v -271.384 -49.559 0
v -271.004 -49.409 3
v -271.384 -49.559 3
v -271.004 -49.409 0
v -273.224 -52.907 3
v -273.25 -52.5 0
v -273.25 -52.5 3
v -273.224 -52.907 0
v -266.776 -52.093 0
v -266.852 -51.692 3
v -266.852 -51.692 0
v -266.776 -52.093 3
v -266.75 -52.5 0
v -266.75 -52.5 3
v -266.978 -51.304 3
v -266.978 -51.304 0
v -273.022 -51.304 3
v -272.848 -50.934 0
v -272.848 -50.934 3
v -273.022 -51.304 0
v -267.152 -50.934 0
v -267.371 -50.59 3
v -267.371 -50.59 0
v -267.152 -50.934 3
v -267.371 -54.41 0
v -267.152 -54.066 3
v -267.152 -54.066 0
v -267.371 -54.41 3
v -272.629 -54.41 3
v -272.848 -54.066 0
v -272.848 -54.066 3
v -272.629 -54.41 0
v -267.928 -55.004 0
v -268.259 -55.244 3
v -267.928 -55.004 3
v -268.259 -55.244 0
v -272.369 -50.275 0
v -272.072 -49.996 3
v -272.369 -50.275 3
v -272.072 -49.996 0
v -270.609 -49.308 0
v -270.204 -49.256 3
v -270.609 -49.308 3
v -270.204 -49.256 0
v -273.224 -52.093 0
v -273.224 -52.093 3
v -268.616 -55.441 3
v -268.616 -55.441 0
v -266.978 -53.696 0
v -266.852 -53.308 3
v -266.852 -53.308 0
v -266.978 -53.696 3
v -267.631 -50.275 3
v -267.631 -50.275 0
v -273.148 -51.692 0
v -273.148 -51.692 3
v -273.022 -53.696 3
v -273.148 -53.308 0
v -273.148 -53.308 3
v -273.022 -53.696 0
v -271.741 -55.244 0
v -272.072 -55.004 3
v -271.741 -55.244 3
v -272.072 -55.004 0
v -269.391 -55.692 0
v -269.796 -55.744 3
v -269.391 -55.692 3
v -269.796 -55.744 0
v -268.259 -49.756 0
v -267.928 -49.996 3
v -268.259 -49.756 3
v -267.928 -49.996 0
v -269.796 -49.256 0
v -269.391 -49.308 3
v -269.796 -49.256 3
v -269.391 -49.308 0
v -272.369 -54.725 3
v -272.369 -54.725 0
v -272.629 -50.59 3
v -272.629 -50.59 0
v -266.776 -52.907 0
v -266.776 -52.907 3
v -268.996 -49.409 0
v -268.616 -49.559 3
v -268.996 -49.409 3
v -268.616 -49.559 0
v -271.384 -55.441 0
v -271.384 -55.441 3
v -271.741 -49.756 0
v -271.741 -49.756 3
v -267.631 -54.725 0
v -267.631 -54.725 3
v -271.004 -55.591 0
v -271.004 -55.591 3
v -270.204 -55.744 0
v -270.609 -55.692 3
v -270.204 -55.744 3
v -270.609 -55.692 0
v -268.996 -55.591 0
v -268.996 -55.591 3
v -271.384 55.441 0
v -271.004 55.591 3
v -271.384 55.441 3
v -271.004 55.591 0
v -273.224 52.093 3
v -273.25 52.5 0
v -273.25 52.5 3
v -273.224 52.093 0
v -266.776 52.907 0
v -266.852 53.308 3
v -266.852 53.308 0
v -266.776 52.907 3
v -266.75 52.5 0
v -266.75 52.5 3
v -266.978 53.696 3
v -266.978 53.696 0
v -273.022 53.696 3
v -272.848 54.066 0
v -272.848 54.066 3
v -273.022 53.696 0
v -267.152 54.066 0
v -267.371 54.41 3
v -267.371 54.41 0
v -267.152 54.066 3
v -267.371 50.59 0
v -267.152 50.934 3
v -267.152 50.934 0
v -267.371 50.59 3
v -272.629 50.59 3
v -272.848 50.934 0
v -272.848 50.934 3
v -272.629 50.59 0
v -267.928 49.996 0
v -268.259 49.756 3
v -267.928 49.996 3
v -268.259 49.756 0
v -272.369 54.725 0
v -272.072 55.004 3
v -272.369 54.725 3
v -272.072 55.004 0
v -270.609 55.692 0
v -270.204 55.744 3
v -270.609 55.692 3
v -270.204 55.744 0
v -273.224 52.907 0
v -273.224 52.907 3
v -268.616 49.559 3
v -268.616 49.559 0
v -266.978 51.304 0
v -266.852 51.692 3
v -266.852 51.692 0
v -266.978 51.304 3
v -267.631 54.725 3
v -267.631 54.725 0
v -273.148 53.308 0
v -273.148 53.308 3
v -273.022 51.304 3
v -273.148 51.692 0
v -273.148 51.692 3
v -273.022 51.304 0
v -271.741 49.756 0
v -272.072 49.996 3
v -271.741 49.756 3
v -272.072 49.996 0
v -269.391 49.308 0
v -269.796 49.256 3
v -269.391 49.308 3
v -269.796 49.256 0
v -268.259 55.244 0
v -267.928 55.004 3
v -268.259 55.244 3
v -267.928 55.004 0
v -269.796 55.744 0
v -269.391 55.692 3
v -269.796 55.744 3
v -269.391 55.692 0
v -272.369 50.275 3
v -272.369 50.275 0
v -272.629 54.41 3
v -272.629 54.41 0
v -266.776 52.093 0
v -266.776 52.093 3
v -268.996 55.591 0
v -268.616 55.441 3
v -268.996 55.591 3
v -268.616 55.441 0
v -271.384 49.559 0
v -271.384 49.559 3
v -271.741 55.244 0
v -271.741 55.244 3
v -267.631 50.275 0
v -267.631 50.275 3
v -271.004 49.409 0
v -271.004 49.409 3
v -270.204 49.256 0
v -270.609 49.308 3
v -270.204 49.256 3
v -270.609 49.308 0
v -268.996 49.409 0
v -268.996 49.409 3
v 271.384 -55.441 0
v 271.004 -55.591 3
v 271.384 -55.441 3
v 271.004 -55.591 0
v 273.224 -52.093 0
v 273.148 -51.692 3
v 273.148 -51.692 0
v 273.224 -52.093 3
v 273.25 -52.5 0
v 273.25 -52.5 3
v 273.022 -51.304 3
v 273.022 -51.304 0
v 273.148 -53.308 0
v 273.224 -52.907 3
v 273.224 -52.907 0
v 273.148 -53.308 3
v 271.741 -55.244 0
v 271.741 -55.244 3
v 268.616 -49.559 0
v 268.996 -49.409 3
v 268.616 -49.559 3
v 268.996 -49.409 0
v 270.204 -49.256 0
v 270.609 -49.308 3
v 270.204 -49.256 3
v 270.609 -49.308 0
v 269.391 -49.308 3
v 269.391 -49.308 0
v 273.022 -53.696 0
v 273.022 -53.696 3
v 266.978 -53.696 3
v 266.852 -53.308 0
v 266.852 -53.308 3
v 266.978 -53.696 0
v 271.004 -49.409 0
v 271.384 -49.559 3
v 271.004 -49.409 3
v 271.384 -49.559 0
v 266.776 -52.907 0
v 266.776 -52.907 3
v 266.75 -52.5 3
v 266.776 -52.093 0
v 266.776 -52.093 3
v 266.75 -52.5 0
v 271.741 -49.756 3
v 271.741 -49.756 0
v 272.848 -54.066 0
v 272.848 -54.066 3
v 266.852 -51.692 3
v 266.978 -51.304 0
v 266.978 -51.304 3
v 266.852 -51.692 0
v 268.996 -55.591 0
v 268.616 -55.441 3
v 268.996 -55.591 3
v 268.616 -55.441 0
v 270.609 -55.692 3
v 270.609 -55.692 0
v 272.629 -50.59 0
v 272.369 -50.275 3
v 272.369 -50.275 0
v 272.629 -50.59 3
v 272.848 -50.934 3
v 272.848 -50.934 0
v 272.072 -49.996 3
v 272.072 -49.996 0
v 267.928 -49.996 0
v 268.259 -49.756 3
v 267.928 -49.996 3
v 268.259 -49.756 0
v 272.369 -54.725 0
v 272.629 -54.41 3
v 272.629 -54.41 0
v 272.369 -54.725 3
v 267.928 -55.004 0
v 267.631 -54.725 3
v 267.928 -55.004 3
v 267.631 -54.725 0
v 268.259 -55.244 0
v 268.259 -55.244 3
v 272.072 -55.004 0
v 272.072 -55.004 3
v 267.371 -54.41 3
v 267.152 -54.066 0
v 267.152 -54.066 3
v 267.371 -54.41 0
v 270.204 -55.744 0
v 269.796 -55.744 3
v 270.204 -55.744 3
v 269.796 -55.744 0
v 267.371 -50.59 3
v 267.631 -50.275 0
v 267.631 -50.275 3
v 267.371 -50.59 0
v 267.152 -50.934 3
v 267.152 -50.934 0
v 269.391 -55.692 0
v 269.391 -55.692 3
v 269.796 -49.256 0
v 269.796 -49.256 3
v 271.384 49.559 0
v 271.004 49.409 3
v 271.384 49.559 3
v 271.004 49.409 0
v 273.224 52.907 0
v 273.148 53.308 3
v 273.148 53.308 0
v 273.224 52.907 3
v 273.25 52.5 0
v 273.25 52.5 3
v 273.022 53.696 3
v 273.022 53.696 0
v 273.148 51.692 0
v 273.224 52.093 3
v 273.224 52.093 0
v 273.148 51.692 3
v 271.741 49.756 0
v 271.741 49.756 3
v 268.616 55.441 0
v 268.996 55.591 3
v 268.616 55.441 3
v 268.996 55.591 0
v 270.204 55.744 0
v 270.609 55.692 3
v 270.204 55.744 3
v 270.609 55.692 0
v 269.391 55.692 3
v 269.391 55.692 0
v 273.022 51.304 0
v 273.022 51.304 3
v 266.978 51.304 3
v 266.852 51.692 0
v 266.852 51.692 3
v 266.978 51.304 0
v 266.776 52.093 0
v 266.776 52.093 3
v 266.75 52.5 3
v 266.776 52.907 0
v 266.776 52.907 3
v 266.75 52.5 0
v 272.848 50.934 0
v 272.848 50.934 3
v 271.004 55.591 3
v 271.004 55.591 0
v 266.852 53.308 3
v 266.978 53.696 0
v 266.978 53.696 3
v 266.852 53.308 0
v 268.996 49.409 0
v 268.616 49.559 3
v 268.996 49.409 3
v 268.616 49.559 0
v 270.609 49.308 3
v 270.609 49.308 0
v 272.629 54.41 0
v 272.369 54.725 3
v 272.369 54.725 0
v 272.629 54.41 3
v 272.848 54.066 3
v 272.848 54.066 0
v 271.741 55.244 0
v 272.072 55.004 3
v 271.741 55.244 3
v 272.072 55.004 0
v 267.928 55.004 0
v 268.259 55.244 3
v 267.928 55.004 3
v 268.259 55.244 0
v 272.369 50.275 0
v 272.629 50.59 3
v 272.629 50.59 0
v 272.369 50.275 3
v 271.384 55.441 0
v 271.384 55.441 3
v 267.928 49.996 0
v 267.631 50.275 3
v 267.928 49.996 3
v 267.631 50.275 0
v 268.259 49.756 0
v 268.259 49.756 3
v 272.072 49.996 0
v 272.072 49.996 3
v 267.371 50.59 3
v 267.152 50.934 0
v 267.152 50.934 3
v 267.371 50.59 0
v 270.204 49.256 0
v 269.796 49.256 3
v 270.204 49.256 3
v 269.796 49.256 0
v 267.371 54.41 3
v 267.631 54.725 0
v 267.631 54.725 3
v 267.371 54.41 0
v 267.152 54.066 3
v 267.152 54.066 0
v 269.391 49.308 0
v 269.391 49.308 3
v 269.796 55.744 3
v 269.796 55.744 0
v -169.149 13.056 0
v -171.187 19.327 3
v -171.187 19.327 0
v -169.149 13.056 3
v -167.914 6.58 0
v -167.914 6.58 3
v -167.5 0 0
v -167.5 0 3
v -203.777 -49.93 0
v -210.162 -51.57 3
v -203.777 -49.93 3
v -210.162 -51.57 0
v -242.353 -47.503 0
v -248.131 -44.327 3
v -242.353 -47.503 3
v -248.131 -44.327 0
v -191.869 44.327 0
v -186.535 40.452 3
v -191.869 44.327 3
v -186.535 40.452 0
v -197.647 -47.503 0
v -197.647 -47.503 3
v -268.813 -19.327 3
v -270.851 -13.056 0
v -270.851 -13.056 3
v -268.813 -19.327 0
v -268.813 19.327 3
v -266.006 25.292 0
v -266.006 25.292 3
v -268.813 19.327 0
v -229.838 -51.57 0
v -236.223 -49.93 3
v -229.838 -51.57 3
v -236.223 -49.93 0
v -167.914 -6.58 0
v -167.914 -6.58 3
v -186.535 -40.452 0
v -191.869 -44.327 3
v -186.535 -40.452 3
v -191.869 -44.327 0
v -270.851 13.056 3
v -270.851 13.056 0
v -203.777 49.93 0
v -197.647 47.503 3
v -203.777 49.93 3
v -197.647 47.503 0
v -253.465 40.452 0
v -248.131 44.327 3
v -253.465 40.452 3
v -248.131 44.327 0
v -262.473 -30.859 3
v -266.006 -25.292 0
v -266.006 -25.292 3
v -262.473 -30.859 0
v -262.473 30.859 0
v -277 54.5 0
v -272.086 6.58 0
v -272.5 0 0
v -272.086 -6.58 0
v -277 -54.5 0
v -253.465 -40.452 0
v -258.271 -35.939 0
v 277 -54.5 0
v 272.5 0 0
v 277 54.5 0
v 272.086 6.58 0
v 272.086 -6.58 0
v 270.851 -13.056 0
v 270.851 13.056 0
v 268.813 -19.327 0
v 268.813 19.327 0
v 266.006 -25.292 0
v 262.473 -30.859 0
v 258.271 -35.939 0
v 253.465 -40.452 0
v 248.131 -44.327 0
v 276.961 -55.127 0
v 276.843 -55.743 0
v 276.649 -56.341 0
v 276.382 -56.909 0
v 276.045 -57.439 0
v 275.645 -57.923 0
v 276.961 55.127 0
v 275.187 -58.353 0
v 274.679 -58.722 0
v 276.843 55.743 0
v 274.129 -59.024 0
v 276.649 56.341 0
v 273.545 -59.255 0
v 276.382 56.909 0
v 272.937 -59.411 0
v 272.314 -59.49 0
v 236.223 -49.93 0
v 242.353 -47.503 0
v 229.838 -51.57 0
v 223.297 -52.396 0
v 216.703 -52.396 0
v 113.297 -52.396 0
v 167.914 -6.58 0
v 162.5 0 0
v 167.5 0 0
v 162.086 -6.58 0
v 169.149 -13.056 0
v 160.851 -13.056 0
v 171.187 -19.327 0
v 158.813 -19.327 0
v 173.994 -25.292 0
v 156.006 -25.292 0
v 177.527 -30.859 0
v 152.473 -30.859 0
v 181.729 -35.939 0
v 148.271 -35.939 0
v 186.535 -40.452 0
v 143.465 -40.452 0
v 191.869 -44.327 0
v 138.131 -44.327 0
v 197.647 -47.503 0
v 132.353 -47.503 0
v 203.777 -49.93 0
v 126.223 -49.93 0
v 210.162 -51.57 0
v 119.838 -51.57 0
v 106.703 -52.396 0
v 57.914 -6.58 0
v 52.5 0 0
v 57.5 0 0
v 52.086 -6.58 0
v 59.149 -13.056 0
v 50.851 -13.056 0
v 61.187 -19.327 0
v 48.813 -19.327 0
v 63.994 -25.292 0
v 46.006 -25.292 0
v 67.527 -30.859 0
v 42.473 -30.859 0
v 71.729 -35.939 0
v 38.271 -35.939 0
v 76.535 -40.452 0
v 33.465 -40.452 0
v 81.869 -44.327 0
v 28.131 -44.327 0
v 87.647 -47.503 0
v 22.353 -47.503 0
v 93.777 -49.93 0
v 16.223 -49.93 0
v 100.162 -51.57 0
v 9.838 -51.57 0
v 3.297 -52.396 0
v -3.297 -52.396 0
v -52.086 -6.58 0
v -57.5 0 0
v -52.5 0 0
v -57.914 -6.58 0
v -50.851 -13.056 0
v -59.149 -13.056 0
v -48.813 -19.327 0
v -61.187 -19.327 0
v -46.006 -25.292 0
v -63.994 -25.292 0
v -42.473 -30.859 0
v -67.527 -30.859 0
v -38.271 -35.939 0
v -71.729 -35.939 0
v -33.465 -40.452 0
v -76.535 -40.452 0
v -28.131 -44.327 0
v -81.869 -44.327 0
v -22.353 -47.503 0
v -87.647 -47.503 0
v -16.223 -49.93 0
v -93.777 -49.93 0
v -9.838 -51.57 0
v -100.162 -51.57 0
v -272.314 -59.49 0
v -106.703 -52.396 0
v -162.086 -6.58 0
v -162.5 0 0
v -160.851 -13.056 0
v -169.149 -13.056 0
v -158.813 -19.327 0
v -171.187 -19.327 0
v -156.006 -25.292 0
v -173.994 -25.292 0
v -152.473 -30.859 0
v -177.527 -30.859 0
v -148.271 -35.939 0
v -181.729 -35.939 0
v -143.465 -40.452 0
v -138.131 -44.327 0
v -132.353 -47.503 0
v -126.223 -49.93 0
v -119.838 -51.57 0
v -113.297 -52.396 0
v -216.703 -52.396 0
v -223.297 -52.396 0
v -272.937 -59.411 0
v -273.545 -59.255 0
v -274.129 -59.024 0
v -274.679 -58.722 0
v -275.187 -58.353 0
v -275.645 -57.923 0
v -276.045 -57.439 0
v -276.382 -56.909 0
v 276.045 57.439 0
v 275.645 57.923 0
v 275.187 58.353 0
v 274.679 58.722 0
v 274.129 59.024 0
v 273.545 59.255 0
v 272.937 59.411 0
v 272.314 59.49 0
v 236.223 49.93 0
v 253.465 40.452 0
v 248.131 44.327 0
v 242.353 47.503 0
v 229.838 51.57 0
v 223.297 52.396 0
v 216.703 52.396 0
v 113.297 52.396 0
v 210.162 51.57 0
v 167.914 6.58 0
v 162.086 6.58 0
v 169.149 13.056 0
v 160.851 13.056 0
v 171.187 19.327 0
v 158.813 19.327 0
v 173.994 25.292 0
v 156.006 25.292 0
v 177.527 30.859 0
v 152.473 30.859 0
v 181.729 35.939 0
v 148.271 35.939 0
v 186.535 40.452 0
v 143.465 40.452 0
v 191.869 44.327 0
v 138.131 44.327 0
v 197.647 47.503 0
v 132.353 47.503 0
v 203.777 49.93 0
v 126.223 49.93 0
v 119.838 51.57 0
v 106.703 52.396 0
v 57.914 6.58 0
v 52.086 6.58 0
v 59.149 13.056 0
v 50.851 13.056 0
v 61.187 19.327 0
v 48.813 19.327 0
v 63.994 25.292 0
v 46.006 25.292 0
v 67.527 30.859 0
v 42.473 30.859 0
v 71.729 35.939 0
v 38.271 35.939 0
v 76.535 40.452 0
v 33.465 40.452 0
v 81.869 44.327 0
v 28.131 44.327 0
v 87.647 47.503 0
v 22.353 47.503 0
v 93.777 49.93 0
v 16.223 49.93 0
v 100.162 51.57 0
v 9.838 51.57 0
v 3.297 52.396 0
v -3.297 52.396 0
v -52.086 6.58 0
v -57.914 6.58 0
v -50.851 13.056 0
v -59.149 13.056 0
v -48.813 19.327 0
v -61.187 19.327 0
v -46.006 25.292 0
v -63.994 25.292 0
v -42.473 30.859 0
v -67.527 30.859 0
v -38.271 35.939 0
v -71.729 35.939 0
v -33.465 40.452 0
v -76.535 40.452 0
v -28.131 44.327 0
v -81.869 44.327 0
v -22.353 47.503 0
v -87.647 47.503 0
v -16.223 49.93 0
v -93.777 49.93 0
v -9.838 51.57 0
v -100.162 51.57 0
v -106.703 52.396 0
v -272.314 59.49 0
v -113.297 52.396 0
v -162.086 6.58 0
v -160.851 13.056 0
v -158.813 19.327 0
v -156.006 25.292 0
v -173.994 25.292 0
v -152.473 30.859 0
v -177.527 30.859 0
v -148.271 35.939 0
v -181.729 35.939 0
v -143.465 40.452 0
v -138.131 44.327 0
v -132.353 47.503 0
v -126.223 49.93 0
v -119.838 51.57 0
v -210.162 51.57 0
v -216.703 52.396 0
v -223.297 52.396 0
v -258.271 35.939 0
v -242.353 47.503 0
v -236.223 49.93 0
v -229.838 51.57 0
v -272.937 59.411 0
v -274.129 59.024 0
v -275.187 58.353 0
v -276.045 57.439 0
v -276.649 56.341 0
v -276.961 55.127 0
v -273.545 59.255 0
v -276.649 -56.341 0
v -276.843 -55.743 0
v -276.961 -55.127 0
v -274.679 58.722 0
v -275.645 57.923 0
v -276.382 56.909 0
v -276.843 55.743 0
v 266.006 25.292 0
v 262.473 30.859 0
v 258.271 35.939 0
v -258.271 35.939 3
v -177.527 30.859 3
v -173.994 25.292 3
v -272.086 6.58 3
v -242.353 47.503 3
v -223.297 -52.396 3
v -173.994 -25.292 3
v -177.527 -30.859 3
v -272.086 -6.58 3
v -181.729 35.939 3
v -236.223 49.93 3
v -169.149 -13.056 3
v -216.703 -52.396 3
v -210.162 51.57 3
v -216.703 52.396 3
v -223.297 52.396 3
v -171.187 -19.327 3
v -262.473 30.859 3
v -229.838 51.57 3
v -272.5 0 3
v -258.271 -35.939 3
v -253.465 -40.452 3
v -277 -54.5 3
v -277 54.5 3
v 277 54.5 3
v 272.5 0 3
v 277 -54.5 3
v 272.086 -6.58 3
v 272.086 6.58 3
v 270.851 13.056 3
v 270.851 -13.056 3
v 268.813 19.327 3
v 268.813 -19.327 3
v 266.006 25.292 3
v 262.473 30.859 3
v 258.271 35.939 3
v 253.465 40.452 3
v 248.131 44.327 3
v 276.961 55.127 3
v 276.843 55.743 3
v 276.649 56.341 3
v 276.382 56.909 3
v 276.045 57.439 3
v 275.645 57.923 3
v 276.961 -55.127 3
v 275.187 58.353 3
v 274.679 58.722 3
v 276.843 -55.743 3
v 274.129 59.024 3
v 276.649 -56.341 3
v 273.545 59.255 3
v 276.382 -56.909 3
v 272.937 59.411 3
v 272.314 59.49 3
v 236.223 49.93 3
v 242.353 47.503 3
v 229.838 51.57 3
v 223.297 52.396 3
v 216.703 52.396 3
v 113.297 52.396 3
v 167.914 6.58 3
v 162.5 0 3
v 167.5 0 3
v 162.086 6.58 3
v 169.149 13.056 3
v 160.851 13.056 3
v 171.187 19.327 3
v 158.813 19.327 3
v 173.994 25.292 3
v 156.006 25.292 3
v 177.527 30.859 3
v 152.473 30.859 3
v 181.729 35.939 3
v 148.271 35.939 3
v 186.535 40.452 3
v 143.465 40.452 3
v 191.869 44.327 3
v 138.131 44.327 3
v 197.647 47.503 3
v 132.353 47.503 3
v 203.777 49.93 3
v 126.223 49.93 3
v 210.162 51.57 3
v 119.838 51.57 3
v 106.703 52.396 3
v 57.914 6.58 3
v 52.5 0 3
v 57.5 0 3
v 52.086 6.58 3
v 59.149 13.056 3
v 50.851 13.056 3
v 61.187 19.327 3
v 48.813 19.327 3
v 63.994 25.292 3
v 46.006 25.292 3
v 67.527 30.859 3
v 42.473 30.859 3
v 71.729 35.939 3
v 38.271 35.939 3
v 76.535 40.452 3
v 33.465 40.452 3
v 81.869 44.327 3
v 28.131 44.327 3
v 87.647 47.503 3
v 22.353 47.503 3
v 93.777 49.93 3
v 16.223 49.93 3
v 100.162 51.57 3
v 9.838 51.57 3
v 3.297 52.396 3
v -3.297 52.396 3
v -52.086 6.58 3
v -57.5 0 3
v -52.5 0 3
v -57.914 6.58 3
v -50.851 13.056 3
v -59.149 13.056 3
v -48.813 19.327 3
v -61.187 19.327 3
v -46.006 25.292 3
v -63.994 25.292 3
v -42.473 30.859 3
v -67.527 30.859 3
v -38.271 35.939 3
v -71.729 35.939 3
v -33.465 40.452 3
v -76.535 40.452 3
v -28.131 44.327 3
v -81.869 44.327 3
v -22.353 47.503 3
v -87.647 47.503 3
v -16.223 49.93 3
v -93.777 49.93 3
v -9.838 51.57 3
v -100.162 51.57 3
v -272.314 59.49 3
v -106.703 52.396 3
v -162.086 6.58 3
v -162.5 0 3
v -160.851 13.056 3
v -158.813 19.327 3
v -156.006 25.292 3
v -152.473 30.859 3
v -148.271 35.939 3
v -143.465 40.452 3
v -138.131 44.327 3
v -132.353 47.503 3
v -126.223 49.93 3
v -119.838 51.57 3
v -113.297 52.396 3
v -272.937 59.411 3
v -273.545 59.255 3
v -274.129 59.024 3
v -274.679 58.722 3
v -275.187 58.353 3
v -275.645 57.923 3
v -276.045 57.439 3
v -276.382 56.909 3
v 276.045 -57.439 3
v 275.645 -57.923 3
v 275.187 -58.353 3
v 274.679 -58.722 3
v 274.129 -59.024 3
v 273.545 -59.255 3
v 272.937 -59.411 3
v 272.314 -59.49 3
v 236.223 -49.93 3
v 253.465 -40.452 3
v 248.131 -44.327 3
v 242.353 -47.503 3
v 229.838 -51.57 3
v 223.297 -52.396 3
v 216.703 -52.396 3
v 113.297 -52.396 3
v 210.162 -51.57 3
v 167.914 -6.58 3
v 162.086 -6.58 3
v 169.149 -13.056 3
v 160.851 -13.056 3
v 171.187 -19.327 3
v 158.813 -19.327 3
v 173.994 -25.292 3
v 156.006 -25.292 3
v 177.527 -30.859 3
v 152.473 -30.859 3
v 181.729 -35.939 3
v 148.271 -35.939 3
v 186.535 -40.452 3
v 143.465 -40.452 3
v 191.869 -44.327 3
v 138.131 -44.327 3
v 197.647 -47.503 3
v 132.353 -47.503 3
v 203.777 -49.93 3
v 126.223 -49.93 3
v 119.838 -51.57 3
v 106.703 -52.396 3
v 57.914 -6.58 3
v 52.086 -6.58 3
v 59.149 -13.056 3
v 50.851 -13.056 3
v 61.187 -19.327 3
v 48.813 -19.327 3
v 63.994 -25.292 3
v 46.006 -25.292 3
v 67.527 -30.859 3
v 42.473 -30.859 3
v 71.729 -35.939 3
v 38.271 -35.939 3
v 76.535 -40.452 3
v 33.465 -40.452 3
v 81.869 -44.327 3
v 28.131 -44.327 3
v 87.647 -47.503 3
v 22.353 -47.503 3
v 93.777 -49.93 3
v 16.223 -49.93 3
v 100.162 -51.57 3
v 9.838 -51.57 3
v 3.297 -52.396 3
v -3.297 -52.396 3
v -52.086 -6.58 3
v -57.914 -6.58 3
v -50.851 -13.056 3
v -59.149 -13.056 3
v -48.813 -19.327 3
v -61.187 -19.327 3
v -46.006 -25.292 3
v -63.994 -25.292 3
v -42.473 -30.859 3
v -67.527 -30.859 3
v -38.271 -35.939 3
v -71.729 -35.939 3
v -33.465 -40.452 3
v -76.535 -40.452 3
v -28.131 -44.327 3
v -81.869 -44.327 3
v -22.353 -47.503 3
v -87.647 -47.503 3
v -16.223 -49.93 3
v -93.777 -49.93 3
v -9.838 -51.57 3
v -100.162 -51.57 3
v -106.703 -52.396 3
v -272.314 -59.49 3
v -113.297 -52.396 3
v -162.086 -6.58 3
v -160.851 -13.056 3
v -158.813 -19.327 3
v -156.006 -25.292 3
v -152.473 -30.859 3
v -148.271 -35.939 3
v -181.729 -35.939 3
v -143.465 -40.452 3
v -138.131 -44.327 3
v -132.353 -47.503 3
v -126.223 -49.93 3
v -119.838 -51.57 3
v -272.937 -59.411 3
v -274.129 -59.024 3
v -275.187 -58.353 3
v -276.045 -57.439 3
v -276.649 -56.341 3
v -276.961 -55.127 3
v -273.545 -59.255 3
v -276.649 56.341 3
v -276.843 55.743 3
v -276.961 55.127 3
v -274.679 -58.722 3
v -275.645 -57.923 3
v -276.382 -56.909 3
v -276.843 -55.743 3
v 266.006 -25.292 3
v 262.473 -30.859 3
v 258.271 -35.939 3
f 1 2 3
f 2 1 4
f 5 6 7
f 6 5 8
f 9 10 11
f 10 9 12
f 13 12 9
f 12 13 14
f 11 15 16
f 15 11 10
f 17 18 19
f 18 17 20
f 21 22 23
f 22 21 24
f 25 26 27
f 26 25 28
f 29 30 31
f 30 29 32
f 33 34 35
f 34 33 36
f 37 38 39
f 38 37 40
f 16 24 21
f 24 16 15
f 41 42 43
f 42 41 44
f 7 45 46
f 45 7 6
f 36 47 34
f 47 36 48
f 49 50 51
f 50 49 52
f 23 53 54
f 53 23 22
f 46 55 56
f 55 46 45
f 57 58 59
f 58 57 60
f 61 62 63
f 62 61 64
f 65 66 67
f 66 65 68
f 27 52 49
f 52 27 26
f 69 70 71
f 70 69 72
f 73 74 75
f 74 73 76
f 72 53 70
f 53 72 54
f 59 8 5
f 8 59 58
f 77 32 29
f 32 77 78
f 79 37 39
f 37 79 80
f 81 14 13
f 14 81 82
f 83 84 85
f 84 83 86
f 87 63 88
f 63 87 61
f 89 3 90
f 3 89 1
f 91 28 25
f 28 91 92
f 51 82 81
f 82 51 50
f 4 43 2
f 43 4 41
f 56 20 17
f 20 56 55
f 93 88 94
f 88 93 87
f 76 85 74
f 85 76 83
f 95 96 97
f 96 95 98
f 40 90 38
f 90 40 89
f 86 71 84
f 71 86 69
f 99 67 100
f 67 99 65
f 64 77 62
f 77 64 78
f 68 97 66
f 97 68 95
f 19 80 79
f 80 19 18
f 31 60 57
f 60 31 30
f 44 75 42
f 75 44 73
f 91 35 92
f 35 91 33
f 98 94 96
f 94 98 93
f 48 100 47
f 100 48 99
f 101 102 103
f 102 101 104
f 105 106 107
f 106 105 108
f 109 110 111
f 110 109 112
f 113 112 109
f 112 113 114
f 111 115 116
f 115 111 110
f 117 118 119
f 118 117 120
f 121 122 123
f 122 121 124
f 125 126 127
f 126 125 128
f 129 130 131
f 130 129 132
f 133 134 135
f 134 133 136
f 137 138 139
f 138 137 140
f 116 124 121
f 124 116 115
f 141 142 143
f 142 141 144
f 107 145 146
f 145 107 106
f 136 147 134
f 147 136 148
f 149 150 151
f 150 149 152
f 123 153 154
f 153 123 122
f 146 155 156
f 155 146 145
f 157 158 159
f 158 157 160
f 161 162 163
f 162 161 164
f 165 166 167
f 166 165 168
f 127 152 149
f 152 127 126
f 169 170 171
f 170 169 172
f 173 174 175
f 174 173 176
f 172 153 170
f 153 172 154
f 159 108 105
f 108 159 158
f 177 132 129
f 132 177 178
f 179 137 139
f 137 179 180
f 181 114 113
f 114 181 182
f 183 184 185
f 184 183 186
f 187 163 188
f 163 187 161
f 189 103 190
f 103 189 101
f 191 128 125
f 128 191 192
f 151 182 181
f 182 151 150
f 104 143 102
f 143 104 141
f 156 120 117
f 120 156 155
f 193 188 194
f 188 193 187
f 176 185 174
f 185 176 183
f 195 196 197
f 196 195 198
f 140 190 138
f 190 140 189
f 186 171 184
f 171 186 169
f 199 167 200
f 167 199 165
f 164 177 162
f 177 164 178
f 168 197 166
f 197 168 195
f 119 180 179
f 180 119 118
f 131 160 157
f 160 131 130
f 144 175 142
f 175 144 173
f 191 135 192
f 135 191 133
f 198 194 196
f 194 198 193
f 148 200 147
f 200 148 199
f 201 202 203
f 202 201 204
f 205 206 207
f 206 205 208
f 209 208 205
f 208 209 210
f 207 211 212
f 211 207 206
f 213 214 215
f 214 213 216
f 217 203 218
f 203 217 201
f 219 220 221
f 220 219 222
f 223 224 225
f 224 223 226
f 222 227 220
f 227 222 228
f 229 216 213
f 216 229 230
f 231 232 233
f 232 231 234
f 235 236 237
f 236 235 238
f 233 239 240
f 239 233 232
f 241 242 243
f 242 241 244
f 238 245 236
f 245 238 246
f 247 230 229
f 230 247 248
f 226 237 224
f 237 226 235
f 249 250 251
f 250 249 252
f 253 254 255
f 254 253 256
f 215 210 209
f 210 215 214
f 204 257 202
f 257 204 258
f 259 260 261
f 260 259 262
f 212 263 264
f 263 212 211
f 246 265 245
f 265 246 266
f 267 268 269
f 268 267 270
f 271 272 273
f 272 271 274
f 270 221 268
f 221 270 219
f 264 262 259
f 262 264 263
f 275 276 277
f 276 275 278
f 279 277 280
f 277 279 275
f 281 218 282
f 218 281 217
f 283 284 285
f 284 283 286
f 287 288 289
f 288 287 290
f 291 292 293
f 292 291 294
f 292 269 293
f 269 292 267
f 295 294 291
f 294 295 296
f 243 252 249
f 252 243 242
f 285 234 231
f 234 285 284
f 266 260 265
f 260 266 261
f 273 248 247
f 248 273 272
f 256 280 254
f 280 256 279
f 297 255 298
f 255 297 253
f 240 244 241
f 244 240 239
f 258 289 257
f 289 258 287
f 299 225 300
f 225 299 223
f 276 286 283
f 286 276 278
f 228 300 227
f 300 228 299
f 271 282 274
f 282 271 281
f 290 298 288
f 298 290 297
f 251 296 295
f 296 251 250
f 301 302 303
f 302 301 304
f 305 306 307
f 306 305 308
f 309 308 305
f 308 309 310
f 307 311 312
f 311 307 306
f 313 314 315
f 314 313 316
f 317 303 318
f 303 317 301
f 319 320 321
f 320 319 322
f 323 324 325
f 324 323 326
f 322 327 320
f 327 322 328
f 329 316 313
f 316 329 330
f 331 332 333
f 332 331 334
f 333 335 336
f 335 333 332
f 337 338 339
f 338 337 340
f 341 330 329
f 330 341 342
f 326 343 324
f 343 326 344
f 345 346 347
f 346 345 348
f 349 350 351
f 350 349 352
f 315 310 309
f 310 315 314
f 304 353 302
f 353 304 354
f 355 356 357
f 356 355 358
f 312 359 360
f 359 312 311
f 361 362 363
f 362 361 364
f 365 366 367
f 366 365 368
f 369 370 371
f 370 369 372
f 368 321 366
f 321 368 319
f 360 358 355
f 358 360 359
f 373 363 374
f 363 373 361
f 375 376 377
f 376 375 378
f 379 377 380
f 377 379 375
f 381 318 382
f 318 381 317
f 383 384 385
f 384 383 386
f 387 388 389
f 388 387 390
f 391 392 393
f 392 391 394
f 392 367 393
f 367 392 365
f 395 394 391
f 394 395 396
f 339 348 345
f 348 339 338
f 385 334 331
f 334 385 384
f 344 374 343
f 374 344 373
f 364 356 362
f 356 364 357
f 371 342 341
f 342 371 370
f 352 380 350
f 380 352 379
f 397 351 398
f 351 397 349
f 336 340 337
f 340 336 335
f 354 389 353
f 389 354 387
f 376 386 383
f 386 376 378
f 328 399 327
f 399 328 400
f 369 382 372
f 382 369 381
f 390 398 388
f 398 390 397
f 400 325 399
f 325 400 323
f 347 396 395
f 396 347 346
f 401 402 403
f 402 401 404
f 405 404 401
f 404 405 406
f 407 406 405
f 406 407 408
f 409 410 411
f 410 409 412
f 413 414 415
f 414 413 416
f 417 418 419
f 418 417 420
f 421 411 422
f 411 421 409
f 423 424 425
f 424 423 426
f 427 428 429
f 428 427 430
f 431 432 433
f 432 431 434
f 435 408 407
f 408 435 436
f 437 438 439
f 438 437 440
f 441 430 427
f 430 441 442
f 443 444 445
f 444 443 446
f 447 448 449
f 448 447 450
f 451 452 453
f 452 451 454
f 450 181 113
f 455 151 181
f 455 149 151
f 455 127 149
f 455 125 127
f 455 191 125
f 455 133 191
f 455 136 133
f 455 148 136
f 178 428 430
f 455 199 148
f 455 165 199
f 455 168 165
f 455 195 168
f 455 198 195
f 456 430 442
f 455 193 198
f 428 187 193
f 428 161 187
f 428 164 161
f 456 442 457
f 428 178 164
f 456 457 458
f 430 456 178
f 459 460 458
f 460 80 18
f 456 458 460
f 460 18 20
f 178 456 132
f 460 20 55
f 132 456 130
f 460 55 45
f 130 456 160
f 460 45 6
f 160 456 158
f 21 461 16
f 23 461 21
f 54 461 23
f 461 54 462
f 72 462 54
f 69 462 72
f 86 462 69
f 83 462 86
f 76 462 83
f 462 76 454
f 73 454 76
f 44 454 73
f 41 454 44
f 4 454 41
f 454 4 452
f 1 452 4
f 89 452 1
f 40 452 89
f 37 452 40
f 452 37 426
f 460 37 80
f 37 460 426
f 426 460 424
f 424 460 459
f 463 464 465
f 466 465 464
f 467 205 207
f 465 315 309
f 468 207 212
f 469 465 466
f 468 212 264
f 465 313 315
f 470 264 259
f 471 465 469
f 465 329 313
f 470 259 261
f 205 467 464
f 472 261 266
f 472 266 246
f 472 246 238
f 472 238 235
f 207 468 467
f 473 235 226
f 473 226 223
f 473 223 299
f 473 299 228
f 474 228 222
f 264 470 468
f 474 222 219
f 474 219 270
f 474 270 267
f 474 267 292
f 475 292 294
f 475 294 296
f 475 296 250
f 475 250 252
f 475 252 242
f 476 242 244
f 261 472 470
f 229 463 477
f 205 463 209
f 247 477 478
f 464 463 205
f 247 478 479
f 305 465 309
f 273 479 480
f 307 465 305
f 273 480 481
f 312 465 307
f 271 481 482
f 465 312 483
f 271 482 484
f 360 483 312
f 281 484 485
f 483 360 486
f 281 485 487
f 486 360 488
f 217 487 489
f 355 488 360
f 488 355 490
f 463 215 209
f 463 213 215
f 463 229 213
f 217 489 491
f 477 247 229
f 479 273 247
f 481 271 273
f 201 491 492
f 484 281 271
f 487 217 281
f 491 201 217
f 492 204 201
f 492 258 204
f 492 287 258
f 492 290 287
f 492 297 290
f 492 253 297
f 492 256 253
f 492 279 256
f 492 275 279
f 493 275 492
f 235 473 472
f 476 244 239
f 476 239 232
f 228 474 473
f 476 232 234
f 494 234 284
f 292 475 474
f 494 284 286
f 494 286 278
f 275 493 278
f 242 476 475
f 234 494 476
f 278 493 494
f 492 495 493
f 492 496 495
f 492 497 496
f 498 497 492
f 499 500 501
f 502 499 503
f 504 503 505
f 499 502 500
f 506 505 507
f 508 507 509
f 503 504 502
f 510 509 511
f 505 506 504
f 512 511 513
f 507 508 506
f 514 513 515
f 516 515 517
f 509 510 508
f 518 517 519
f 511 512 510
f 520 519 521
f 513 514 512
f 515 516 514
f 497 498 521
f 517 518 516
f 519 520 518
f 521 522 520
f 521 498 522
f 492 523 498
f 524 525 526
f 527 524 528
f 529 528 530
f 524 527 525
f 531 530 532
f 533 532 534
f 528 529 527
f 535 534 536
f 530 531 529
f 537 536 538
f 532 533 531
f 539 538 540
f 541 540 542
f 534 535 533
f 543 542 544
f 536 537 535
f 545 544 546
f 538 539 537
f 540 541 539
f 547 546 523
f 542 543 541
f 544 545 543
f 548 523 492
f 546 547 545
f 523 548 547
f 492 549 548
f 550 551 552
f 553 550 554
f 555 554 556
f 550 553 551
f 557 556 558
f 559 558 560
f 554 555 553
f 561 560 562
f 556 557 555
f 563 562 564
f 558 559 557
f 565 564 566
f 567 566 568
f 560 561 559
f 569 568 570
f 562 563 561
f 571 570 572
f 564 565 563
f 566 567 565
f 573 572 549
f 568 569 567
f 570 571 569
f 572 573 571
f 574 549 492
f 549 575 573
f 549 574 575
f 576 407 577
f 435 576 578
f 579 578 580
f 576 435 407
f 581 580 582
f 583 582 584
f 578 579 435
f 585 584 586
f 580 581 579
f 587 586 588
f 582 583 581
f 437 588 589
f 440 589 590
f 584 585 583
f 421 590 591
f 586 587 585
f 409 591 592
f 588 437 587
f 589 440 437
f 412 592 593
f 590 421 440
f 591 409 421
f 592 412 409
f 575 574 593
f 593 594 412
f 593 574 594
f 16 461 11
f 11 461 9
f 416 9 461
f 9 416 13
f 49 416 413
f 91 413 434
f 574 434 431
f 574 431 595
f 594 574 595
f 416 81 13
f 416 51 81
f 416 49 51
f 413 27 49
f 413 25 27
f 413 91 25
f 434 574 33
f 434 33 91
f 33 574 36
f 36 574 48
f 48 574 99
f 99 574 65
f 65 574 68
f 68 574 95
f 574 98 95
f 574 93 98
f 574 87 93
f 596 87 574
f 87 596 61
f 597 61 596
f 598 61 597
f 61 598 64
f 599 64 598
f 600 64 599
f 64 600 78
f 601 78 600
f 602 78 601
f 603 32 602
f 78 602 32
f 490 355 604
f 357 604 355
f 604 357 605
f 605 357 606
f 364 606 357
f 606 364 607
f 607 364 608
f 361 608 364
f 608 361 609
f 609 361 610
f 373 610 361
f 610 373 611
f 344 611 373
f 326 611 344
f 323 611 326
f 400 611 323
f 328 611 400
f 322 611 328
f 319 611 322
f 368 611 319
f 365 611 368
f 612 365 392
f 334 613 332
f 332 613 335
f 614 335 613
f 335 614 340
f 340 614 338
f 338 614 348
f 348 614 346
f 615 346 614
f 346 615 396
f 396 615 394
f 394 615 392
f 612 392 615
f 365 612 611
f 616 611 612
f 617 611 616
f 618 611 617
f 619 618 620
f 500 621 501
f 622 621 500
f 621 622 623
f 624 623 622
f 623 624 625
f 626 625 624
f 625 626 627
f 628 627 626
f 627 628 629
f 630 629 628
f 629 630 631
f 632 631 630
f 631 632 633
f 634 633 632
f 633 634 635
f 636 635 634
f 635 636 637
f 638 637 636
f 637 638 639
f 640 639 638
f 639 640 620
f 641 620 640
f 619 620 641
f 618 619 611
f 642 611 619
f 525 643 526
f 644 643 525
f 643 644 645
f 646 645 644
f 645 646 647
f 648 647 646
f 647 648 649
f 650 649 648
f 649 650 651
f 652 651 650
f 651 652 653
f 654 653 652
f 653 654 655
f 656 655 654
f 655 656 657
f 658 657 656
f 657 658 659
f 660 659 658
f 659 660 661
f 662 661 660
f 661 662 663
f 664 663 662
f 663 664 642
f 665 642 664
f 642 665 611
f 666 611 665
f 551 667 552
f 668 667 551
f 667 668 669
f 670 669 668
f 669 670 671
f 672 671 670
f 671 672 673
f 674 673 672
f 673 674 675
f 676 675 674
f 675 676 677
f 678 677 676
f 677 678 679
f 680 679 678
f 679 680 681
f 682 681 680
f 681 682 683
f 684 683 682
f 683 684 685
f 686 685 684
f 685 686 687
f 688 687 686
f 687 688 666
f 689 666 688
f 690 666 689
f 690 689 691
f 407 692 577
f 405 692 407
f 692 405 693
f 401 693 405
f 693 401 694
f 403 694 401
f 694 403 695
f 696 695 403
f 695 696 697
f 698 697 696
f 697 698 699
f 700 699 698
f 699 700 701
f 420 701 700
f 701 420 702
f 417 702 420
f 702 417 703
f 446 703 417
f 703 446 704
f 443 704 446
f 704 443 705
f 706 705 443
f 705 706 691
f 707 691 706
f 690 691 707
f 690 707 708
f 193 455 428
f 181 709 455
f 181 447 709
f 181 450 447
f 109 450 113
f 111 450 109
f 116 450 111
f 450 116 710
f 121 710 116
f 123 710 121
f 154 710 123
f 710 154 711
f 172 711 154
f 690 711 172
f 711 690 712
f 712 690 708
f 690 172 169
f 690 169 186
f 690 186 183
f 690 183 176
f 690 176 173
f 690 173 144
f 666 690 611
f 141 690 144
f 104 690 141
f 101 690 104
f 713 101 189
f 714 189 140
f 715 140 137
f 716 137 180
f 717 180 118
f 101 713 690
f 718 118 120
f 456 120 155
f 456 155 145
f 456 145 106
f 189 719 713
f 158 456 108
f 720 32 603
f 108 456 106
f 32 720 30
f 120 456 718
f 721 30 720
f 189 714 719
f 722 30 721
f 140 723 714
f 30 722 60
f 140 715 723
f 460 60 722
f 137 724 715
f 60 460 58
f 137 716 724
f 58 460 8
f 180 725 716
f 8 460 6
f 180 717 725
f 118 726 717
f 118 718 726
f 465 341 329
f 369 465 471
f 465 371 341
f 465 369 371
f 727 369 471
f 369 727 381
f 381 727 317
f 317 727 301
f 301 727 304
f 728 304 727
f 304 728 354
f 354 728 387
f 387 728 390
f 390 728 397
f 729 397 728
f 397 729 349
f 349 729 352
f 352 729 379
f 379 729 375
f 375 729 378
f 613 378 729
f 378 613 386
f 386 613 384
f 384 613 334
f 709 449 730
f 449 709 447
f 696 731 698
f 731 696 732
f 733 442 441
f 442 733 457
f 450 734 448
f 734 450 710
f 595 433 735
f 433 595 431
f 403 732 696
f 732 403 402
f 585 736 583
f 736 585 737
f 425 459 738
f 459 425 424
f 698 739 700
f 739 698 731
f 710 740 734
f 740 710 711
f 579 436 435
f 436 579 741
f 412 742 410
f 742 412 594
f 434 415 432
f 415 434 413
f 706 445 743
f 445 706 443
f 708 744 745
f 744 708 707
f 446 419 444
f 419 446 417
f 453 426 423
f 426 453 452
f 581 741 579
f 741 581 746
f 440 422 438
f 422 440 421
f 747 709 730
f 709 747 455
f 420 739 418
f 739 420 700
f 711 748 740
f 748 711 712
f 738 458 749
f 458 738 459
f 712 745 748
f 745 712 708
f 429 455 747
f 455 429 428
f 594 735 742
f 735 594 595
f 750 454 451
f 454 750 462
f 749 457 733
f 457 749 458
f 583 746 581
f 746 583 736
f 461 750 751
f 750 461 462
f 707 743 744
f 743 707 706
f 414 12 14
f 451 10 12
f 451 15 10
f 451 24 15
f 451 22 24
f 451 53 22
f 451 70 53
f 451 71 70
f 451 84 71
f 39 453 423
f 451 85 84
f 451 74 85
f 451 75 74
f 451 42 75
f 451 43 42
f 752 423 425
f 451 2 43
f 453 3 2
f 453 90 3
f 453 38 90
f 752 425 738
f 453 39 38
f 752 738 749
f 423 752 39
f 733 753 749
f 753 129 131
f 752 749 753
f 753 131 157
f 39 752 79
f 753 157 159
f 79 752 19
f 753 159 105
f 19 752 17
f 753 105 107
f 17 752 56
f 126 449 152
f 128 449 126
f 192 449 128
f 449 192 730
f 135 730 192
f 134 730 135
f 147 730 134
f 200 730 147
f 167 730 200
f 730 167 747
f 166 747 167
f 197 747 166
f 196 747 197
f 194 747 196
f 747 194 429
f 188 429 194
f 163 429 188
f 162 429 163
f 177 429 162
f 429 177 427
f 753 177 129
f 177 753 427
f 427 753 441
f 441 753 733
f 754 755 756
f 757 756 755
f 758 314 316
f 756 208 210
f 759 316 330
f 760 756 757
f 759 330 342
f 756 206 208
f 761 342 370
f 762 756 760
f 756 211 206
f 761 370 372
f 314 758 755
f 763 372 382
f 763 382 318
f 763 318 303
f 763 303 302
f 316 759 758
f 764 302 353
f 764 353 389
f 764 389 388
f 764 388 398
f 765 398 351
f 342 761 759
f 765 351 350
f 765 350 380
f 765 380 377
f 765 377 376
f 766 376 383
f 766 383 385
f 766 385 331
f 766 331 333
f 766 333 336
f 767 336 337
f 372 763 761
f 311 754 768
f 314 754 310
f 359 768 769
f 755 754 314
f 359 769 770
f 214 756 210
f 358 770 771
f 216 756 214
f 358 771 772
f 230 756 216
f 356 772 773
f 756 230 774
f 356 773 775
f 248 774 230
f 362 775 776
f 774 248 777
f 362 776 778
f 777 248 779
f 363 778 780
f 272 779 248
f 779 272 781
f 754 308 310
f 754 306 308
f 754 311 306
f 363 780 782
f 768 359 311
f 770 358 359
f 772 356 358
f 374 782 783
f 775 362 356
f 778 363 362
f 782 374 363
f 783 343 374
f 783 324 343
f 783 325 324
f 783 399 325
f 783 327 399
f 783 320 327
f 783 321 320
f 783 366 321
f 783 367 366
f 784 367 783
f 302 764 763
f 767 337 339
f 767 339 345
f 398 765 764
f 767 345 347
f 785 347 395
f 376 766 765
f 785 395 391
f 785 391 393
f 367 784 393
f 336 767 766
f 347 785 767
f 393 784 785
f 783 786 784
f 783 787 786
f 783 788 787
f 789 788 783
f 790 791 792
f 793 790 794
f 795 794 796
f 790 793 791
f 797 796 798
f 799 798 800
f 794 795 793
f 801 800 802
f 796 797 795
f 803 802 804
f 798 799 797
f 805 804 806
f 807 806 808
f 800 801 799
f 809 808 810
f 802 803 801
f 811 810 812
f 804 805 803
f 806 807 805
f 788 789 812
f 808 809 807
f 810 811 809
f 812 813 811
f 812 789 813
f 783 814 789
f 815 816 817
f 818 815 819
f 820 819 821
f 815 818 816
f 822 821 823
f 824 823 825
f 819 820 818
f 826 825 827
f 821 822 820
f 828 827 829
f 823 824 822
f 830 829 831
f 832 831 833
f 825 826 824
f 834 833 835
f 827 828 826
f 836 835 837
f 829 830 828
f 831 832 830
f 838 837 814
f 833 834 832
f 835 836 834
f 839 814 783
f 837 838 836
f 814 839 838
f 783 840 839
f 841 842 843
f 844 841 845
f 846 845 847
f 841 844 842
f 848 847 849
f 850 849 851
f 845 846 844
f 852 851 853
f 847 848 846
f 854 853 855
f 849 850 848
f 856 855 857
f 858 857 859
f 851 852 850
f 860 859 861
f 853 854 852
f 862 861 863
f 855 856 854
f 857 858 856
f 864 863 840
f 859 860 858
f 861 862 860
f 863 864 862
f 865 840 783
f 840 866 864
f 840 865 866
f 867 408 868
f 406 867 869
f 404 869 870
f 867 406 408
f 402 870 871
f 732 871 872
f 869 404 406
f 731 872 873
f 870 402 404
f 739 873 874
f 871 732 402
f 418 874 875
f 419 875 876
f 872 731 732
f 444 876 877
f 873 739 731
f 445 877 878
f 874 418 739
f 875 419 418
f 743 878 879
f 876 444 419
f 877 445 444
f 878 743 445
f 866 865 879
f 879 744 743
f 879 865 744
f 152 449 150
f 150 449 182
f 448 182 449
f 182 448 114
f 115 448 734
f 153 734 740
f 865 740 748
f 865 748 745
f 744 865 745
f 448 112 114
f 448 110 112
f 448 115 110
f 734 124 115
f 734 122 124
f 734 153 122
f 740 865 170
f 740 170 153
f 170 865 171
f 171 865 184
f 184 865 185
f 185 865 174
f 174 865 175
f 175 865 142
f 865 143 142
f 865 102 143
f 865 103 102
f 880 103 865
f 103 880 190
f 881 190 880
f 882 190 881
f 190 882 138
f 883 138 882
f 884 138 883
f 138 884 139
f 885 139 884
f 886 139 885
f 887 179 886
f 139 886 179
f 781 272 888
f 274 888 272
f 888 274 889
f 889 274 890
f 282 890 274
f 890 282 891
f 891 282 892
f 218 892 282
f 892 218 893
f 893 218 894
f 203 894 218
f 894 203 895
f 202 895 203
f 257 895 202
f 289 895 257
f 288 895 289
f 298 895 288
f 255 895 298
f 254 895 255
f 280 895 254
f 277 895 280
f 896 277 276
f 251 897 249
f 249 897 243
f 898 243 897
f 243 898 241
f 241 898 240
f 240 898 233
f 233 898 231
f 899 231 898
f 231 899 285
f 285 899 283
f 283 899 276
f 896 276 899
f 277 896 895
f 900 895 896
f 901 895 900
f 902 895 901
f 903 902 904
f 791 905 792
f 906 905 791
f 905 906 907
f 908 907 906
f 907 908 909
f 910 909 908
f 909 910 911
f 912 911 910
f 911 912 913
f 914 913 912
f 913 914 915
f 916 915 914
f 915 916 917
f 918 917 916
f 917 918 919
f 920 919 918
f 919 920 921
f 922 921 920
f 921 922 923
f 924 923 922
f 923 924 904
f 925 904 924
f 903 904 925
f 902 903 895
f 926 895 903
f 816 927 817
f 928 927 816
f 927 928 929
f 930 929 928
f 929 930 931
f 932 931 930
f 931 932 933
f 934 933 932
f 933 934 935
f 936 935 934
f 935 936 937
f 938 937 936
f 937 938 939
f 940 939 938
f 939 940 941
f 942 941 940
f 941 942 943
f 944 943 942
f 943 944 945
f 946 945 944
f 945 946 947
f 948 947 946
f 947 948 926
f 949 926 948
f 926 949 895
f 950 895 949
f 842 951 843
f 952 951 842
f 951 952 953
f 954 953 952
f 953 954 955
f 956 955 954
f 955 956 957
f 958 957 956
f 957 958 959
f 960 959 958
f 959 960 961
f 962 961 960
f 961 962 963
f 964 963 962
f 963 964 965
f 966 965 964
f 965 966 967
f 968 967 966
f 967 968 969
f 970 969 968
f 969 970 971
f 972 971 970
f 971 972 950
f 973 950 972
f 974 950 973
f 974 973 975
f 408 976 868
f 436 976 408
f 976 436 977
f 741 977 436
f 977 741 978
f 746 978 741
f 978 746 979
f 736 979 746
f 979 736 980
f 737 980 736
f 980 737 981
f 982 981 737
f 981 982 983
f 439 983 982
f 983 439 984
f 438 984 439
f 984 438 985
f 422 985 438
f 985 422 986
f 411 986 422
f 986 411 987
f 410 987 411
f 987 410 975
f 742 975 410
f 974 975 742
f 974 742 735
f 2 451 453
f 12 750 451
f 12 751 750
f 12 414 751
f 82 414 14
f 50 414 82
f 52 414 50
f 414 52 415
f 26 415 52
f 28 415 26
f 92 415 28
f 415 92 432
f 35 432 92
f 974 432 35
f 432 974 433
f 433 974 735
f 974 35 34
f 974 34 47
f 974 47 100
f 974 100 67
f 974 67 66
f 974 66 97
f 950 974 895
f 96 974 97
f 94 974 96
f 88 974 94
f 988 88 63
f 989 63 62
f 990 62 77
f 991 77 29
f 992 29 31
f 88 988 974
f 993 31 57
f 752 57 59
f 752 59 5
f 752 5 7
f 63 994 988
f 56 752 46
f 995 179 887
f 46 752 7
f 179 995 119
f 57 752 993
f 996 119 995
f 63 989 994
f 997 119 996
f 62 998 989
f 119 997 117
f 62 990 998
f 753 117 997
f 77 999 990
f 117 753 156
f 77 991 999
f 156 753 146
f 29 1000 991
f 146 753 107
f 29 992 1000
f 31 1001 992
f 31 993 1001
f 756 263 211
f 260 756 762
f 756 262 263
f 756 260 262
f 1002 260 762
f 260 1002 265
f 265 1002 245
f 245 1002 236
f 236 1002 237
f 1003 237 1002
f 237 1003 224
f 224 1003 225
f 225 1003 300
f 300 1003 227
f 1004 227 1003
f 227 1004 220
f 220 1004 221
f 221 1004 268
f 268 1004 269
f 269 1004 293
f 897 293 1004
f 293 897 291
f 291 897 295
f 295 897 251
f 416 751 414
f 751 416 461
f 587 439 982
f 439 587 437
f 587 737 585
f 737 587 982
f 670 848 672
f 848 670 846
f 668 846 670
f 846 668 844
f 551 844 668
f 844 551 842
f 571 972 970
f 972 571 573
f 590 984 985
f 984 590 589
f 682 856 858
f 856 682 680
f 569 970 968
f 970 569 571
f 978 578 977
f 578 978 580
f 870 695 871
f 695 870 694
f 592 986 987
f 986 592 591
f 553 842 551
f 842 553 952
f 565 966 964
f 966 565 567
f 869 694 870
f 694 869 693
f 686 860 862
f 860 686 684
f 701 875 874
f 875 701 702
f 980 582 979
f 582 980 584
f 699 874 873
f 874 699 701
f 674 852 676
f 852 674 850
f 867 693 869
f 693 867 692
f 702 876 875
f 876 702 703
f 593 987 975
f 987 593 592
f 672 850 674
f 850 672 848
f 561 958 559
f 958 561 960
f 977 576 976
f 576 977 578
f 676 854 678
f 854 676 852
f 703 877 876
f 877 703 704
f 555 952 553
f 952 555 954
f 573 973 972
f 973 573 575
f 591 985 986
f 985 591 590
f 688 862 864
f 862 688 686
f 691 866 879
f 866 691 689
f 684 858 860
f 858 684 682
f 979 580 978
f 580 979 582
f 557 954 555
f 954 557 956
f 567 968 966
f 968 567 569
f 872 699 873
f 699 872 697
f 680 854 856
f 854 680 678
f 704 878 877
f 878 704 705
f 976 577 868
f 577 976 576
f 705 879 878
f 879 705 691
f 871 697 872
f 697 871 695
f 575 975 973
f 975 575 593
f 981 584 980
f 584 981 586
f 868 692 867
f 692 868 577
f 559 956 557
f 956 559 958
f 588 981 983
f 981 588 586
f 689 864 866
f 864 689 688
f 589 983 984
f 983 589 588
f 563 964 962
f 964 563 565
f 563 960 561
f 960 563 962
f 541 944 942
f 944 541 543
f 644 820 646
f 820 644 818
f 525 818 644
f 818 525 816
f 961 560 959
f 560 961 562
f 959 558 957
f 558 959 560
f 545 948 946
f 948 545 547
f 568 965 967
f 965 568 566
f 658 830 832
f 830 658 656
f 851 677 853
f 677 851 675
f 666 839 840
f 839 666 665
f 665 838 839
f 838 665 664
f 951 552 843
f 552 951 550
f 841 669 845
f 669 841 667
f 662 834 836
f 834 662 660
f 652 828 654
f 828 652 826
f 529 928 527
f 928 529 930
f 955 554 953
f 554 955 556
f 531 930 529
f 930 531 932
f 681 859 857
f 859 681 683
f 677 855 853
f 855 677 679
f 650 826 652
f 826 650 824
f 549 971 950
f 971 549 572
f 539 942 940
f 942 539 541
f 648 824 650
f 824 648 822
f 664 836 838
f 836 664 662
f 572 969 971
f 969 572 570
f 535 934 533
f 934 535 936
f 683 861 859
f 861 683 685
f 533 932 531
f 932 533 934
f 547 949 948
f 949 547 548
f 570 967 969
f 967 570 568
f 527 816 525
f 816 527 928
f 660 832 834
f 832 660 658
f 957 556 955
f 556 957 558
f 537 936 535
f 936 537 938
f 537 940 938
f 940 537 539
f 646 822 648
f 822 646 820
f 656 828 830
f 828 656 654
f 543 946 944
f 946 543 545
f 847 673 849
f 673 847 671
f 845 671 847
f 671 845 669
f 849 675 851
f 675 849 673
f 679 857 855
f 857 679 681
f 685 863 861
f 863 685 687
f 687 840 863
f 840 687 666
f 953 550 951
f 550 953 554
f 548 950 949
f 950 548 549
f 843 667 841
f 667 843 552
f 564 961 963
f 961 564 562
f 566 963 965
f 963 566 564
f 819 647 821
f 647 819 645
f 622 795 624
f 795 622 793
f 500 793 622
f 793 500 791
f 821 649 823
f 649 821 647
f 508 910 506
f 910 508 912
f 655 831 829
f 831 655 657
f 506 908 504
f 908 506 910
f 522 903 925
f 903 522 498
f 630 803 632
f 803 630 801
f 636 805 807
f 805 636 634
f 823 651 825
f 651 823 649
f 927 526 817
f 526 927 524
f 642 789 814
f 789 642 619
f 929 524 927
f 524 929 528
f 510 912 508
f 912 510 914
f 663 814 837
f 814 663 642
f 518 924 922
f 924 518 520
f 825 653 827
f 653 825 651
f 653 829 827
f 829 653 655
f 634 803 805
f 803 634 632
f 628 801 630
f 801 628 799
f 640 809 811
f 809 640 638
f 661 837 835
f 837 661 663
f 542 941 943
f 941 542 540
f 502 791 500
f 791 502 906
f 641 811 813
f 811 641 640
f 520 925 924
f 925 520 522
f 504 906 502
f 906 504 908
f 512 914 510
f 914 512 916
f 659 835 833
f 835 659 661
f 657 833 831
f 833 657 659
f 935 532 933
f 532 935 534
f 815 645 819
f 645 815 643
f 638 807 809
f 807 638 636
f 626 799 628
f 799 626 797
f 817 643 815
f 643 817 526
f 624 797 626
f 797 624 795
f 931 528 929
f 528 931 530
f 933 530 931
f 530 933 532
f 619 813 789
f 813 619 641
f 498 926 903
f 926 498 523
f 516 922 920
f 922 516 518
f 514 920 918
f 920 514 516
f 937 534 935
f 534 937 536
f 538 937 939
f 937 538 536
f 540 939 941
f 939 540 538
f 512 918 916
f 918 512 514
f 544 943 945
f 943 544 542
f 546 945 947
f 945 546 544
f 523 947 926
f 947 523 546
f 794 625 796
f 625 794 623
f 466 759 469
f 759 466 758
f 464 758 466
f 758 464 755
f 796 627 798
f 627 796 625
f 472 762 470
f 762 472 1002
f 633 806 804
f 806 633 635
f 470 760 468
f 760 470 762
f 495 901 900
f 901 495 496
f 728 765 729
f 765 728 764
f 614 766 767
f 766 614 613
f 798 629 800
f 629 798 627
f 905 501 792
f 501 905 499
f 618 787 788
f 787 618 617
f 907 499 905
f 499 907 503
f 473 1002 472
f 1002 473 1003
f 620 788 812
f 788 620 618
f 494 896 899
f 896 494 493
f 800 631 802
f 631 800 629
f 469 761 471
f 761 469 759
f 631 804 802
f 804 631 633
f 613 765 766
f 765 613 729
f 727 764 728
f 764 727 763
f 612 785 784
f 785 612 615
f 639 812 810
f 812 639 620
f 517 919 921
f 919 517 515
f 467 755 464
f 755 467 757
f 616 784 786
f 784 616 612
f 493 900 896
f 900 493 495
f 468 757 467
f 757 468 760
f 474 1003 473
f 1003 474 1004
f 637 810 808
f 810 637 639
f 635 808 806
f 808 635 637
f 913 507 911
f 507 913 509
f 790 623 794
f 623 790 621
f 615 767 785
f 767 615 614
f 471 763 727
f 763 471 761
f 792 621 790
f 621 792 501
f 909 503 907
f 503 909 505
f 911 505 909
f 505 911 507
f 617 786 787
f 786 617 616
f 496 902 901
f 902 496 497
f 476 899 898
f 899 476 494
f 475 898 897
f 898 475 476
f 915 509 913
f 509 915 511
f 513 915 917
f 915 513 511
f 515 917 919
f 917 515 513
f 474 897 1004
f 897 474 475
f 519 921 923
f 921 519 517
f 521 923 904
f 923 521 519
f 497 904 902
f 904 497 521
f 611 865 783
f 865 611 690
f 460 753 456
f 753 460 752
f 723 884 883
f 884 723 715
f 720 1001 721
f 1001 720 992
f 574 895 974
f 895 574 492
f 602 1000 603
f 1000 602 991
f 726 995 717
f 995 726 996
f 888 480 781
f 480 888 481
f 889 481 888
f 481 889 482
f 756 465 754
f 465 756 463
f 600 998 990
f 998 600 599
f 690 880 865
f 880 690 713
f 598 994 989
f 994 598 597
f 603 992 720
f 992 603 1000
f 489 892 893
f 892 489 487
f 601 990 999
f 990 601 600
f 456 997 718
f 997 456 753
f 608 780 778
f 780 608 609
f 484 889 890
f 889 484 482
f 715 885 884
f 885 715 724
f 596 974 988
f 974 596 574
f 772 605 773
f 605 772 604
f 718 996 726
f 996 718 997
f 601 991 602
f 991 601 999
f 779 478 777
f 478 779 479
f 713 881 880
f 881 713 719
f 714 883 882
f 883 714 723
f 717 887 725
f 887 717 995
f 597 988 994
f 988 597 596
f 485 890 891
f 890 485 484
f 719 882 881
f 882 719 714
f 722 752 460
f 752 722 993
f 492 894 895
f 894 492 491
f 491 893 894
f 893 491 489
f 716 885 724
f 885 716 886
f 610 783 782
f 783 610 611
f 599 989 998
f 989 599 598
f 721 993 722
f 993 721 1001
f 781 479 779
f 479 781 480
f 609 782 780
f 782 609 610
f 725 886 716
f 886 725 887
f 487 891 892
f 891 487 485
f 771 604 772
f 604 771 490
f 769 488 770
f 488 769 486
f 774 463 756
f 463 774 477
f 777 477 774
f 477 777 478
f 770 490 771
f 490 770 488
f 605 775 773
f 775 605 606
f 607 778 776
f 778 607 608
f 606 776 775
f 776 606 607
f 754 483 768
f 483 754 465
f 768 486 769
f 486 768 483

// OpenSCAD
$fn = 50;


difference() {
	union() {
		hull() {
			translate(v = [-272.0000000000, 54.5000000000, 0]) {
				cylinder(h = 3, r = 5);
			}
			translate(v = [272.0000000000, 54.5000000000, 0]) {
				cylinder(h = 3, r = 5);
			}
			translate(v = [-272.0000000000, -54.5000000000, 0]) {
				cylinder(h = 3, r = 5);
			}
			translate(v = [272.0000000000, -54.5000000000, 0]) {
				cylinder(h = 3, r = 5);
			}
		}
	}
	union() {
		#translate(v = [-270.0000000000, -52.5000000000, -100.0000000000]) {
			cylinder(h = 200, r = 3.2500000000);
		}
		#translate(v = [-270.0000000000, 52.5000000000, -100.0000000000]) {
			cylinder(h = 200, r = 3.2500000000);
		}
		#translate(v = [270.0000000000, -52.5000000000, -100.0000000000]) {
			cylinder(h = 200, r = 3.2500000000);
		}
		#translate(v = [270.0000000000, 52.5000000000, -100.0000000000]) {
			cylinder(h = 200, r = 3.2500000000);
		}
		#translate(v = [-220.0000000000, 0, 0]) {
			cylinder(h = 3, r = 52.5000000000);
		}
		#translate(v = [-110.0000000000, 0, 0]) {
			cylinder(h = 3, r = 52.5000000000);
		}
		#cylinder(h = 3, r = 52.5000000000);
		#translate(v = [110.0000000000, 0, 0]) {
			cylinder(h = 3, r = 52.5000000000);
		}
		#translate(v = [220.0000000000, 0, 0]) {
			cylinder(h = 3, r = 52.5000000000);
		}
	}
}
